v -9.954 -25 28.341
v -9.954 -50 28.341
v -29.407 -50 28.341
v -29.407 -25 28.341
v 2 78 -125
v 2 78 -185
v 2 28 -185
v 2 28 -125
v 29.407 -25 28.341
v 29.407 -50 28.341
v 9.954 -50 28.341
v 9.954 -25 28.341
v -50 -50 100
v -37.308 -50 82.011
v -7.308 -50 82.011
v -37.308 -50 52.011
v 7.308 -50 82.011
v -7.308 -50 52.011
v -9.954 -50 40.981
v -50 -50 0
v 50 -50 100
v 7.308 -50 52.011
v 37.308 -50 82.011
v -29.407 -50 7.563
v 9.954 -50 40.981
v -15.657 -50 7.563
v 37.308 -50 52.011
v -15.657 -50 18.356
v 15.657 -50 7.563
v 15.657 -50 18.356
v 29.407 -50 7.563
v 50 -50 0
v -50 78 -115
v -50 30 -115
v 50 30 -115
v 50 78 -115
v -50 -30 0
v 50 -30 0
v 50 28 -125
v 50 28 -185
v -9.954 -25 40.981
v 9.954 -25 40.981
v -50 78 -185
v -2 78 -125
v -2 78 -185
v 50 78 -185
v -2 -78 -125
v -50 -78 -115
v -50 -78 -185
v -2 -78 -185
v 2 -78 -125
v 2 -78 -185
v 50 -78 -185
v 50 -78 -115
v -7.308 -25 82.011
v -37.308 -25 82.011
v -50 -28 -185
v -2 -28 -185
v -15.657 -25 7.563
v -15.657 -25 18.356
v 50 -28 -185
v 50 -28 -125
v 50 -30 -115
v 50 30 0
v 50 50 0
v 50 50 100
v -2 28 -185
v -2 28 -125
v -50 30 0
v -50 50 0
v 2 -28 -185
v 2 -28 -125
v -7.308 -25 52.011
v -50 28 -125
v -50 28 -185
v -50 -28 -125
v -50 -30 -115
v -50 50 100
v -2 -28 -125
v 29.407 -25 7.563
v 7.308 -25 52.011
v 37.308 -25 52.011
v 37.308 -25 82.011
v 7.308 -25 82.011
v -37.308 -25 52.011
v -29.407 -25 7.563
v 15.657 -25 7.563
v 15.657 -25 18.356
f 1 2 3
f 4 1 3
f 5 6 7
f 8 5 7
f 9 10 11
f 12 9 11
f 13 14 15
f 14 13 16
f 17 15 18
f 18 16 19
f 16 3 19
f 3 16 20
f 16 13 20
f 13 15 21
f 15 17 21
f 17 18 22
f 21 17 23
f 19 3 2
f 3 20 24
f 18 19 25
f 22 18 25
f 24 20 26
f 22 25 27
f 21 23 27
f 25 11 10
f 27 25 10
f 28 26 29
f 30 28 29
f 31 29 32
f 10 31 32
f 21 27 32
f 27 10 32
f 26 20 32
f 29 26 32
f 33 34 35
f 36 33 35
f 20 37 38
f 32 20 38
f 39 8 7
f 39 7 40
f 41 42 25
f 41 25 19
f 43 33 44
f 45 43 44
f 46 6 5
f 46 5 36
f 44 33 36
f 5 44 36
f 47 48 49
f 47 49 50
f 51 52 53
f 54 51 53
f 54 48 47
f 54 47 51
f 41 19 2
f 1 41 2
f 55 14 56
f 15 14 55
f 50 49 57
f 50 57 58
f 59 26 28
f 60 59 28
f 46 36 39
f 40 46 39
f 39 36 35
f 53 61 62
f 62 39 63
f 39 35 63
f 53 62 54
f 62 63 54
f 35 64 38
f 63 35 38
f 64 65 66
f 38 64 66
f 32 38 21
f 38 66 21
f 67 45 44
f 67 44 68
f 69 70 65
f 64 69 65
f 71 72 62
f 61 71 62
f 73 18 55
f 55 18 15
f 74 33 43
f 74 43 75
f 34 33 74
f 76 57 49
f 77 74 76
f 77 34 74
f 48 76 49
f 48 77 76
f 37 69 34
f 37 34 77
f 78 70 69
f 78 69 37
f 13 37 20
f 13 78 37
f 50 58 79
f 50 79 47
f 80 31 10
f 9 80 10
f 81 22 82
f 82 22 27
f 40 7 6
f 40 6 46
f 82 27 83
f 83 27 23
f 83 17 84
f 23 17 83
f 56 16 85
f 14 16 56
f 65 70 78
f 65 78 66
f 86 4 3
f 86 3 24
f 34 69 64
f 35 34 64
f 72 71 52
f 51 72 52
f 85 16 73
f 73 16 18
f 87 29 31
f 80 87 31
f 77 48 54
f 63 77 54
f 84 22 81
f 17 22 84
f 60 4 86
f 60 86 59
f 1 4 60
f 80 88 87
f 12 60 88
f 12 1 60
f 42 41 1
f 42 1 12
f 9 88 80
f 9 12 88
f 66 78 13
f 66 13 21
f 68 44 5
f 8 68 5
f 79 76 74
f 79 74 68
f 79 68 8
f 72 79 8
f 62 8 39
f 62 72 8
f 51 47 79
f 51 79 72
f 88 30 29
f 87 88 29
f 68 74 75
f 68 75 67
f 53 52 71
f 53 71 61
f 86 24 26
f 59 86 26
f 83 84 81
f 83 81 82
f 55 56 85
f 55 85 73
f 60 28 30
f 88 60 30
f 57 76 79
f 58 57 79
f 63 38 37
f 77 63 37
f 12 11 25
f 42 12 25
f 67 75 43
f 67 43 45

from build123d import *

# Parameters (mm, degrees)
F0_W     = 100
F0_H     = 100
F1_DEPTH = 100
F2_W     = 30
F2_H     = 30
F3_DEPTH = 25
F4_W     = 50
F4_H     = 30
F5_DEPTH = 115
F6_W     = 100
F6_H     = 156
F7_DEPTH = 10
F8_W     = 48
F8_H     = 50
F9_DEPTH = 60


with BuildPart() as f1:
    # F0 (on Top) → F1 (new body)
    with BuildSketch(Plane.XY):
        Rectangle(F0_W, F0_H)
    extrude(amount=F1_DEPTH)

    # F2 (on face) → F3 (cut)
    with BuildSketch(Plane.XZ.offset(50)):
        with Locations((-22.308369, 67.011483)):
            Rectangle(F2_W, F2_H)
        with Locations((22.308369, 67.011483)):
            Rectangle(F2_W, F2_H)
        Polygon((9.954443, 40.98089), (0, 40.98089), (-9.954443, 40.98089), (-9.954443, 28.341211), (-29.406976, 28.341211), (-29.406976, 7.562513), (-15.657233, 7.562513), (-15.657233, 18.356016), (0, 18.356016), (15.657233, 18.356016), (15.657233, 7.562513), (29.406976, 7.562513), (29.406976, 28.341211), (9.954443, 28.341211), align=None)
    extrude(amount=-F3_DEPTH, mode=Mode.SUBTRACT)

    # F4 (on face) → F5 (join)
    with BuildSketch(Plane(origin=(0, 0, 0), x_dir=(1, 0, 0), z_dir=(0, 0, -1))):
        with Locations((25, -15)):
            Rectangle(F4_W, F4_H)
        with Locations((25, 15)):
            Rectangle(F4_W, F4_H)
        with Locations((-25, -15)):
            Rectangle(F4_W, F4_H)
        with Locations((-25, 15)):
            Rectangle(F4_W, F4_H)
    extrude(amount=F5_DEPTH)

    # F6 (on face) → F7 (join)
    with BuildSketch(Plane(origin=(0, 0, -115), x_dir=(1, 0, 0), z_dir=(0, 0, -1))):
        Rectangle(F6_W, F6_H)
    extrude(amount=F7_DEPTH)

    # F8 (on face) → F9 (join)
    with BuildSketch(Plane(origin=(0, 0, -125), x_dir=(1, 0, 0), z_dir=(0, 0, -1))):
        with Locations((-26, 53)):
            Rectangle(F8_W, F8_H)
        with Locations((26, 53)):
            Rectangle(F8_W, F8_H)
        with Locations((-26, -53)):
            Rectangle(F8_W, F8_H)
        with Locations((26, -53)):
            Rectangle(F8_W, F8_H)
    extrude(amount=F9_DEPTH)


solid = f1.part
